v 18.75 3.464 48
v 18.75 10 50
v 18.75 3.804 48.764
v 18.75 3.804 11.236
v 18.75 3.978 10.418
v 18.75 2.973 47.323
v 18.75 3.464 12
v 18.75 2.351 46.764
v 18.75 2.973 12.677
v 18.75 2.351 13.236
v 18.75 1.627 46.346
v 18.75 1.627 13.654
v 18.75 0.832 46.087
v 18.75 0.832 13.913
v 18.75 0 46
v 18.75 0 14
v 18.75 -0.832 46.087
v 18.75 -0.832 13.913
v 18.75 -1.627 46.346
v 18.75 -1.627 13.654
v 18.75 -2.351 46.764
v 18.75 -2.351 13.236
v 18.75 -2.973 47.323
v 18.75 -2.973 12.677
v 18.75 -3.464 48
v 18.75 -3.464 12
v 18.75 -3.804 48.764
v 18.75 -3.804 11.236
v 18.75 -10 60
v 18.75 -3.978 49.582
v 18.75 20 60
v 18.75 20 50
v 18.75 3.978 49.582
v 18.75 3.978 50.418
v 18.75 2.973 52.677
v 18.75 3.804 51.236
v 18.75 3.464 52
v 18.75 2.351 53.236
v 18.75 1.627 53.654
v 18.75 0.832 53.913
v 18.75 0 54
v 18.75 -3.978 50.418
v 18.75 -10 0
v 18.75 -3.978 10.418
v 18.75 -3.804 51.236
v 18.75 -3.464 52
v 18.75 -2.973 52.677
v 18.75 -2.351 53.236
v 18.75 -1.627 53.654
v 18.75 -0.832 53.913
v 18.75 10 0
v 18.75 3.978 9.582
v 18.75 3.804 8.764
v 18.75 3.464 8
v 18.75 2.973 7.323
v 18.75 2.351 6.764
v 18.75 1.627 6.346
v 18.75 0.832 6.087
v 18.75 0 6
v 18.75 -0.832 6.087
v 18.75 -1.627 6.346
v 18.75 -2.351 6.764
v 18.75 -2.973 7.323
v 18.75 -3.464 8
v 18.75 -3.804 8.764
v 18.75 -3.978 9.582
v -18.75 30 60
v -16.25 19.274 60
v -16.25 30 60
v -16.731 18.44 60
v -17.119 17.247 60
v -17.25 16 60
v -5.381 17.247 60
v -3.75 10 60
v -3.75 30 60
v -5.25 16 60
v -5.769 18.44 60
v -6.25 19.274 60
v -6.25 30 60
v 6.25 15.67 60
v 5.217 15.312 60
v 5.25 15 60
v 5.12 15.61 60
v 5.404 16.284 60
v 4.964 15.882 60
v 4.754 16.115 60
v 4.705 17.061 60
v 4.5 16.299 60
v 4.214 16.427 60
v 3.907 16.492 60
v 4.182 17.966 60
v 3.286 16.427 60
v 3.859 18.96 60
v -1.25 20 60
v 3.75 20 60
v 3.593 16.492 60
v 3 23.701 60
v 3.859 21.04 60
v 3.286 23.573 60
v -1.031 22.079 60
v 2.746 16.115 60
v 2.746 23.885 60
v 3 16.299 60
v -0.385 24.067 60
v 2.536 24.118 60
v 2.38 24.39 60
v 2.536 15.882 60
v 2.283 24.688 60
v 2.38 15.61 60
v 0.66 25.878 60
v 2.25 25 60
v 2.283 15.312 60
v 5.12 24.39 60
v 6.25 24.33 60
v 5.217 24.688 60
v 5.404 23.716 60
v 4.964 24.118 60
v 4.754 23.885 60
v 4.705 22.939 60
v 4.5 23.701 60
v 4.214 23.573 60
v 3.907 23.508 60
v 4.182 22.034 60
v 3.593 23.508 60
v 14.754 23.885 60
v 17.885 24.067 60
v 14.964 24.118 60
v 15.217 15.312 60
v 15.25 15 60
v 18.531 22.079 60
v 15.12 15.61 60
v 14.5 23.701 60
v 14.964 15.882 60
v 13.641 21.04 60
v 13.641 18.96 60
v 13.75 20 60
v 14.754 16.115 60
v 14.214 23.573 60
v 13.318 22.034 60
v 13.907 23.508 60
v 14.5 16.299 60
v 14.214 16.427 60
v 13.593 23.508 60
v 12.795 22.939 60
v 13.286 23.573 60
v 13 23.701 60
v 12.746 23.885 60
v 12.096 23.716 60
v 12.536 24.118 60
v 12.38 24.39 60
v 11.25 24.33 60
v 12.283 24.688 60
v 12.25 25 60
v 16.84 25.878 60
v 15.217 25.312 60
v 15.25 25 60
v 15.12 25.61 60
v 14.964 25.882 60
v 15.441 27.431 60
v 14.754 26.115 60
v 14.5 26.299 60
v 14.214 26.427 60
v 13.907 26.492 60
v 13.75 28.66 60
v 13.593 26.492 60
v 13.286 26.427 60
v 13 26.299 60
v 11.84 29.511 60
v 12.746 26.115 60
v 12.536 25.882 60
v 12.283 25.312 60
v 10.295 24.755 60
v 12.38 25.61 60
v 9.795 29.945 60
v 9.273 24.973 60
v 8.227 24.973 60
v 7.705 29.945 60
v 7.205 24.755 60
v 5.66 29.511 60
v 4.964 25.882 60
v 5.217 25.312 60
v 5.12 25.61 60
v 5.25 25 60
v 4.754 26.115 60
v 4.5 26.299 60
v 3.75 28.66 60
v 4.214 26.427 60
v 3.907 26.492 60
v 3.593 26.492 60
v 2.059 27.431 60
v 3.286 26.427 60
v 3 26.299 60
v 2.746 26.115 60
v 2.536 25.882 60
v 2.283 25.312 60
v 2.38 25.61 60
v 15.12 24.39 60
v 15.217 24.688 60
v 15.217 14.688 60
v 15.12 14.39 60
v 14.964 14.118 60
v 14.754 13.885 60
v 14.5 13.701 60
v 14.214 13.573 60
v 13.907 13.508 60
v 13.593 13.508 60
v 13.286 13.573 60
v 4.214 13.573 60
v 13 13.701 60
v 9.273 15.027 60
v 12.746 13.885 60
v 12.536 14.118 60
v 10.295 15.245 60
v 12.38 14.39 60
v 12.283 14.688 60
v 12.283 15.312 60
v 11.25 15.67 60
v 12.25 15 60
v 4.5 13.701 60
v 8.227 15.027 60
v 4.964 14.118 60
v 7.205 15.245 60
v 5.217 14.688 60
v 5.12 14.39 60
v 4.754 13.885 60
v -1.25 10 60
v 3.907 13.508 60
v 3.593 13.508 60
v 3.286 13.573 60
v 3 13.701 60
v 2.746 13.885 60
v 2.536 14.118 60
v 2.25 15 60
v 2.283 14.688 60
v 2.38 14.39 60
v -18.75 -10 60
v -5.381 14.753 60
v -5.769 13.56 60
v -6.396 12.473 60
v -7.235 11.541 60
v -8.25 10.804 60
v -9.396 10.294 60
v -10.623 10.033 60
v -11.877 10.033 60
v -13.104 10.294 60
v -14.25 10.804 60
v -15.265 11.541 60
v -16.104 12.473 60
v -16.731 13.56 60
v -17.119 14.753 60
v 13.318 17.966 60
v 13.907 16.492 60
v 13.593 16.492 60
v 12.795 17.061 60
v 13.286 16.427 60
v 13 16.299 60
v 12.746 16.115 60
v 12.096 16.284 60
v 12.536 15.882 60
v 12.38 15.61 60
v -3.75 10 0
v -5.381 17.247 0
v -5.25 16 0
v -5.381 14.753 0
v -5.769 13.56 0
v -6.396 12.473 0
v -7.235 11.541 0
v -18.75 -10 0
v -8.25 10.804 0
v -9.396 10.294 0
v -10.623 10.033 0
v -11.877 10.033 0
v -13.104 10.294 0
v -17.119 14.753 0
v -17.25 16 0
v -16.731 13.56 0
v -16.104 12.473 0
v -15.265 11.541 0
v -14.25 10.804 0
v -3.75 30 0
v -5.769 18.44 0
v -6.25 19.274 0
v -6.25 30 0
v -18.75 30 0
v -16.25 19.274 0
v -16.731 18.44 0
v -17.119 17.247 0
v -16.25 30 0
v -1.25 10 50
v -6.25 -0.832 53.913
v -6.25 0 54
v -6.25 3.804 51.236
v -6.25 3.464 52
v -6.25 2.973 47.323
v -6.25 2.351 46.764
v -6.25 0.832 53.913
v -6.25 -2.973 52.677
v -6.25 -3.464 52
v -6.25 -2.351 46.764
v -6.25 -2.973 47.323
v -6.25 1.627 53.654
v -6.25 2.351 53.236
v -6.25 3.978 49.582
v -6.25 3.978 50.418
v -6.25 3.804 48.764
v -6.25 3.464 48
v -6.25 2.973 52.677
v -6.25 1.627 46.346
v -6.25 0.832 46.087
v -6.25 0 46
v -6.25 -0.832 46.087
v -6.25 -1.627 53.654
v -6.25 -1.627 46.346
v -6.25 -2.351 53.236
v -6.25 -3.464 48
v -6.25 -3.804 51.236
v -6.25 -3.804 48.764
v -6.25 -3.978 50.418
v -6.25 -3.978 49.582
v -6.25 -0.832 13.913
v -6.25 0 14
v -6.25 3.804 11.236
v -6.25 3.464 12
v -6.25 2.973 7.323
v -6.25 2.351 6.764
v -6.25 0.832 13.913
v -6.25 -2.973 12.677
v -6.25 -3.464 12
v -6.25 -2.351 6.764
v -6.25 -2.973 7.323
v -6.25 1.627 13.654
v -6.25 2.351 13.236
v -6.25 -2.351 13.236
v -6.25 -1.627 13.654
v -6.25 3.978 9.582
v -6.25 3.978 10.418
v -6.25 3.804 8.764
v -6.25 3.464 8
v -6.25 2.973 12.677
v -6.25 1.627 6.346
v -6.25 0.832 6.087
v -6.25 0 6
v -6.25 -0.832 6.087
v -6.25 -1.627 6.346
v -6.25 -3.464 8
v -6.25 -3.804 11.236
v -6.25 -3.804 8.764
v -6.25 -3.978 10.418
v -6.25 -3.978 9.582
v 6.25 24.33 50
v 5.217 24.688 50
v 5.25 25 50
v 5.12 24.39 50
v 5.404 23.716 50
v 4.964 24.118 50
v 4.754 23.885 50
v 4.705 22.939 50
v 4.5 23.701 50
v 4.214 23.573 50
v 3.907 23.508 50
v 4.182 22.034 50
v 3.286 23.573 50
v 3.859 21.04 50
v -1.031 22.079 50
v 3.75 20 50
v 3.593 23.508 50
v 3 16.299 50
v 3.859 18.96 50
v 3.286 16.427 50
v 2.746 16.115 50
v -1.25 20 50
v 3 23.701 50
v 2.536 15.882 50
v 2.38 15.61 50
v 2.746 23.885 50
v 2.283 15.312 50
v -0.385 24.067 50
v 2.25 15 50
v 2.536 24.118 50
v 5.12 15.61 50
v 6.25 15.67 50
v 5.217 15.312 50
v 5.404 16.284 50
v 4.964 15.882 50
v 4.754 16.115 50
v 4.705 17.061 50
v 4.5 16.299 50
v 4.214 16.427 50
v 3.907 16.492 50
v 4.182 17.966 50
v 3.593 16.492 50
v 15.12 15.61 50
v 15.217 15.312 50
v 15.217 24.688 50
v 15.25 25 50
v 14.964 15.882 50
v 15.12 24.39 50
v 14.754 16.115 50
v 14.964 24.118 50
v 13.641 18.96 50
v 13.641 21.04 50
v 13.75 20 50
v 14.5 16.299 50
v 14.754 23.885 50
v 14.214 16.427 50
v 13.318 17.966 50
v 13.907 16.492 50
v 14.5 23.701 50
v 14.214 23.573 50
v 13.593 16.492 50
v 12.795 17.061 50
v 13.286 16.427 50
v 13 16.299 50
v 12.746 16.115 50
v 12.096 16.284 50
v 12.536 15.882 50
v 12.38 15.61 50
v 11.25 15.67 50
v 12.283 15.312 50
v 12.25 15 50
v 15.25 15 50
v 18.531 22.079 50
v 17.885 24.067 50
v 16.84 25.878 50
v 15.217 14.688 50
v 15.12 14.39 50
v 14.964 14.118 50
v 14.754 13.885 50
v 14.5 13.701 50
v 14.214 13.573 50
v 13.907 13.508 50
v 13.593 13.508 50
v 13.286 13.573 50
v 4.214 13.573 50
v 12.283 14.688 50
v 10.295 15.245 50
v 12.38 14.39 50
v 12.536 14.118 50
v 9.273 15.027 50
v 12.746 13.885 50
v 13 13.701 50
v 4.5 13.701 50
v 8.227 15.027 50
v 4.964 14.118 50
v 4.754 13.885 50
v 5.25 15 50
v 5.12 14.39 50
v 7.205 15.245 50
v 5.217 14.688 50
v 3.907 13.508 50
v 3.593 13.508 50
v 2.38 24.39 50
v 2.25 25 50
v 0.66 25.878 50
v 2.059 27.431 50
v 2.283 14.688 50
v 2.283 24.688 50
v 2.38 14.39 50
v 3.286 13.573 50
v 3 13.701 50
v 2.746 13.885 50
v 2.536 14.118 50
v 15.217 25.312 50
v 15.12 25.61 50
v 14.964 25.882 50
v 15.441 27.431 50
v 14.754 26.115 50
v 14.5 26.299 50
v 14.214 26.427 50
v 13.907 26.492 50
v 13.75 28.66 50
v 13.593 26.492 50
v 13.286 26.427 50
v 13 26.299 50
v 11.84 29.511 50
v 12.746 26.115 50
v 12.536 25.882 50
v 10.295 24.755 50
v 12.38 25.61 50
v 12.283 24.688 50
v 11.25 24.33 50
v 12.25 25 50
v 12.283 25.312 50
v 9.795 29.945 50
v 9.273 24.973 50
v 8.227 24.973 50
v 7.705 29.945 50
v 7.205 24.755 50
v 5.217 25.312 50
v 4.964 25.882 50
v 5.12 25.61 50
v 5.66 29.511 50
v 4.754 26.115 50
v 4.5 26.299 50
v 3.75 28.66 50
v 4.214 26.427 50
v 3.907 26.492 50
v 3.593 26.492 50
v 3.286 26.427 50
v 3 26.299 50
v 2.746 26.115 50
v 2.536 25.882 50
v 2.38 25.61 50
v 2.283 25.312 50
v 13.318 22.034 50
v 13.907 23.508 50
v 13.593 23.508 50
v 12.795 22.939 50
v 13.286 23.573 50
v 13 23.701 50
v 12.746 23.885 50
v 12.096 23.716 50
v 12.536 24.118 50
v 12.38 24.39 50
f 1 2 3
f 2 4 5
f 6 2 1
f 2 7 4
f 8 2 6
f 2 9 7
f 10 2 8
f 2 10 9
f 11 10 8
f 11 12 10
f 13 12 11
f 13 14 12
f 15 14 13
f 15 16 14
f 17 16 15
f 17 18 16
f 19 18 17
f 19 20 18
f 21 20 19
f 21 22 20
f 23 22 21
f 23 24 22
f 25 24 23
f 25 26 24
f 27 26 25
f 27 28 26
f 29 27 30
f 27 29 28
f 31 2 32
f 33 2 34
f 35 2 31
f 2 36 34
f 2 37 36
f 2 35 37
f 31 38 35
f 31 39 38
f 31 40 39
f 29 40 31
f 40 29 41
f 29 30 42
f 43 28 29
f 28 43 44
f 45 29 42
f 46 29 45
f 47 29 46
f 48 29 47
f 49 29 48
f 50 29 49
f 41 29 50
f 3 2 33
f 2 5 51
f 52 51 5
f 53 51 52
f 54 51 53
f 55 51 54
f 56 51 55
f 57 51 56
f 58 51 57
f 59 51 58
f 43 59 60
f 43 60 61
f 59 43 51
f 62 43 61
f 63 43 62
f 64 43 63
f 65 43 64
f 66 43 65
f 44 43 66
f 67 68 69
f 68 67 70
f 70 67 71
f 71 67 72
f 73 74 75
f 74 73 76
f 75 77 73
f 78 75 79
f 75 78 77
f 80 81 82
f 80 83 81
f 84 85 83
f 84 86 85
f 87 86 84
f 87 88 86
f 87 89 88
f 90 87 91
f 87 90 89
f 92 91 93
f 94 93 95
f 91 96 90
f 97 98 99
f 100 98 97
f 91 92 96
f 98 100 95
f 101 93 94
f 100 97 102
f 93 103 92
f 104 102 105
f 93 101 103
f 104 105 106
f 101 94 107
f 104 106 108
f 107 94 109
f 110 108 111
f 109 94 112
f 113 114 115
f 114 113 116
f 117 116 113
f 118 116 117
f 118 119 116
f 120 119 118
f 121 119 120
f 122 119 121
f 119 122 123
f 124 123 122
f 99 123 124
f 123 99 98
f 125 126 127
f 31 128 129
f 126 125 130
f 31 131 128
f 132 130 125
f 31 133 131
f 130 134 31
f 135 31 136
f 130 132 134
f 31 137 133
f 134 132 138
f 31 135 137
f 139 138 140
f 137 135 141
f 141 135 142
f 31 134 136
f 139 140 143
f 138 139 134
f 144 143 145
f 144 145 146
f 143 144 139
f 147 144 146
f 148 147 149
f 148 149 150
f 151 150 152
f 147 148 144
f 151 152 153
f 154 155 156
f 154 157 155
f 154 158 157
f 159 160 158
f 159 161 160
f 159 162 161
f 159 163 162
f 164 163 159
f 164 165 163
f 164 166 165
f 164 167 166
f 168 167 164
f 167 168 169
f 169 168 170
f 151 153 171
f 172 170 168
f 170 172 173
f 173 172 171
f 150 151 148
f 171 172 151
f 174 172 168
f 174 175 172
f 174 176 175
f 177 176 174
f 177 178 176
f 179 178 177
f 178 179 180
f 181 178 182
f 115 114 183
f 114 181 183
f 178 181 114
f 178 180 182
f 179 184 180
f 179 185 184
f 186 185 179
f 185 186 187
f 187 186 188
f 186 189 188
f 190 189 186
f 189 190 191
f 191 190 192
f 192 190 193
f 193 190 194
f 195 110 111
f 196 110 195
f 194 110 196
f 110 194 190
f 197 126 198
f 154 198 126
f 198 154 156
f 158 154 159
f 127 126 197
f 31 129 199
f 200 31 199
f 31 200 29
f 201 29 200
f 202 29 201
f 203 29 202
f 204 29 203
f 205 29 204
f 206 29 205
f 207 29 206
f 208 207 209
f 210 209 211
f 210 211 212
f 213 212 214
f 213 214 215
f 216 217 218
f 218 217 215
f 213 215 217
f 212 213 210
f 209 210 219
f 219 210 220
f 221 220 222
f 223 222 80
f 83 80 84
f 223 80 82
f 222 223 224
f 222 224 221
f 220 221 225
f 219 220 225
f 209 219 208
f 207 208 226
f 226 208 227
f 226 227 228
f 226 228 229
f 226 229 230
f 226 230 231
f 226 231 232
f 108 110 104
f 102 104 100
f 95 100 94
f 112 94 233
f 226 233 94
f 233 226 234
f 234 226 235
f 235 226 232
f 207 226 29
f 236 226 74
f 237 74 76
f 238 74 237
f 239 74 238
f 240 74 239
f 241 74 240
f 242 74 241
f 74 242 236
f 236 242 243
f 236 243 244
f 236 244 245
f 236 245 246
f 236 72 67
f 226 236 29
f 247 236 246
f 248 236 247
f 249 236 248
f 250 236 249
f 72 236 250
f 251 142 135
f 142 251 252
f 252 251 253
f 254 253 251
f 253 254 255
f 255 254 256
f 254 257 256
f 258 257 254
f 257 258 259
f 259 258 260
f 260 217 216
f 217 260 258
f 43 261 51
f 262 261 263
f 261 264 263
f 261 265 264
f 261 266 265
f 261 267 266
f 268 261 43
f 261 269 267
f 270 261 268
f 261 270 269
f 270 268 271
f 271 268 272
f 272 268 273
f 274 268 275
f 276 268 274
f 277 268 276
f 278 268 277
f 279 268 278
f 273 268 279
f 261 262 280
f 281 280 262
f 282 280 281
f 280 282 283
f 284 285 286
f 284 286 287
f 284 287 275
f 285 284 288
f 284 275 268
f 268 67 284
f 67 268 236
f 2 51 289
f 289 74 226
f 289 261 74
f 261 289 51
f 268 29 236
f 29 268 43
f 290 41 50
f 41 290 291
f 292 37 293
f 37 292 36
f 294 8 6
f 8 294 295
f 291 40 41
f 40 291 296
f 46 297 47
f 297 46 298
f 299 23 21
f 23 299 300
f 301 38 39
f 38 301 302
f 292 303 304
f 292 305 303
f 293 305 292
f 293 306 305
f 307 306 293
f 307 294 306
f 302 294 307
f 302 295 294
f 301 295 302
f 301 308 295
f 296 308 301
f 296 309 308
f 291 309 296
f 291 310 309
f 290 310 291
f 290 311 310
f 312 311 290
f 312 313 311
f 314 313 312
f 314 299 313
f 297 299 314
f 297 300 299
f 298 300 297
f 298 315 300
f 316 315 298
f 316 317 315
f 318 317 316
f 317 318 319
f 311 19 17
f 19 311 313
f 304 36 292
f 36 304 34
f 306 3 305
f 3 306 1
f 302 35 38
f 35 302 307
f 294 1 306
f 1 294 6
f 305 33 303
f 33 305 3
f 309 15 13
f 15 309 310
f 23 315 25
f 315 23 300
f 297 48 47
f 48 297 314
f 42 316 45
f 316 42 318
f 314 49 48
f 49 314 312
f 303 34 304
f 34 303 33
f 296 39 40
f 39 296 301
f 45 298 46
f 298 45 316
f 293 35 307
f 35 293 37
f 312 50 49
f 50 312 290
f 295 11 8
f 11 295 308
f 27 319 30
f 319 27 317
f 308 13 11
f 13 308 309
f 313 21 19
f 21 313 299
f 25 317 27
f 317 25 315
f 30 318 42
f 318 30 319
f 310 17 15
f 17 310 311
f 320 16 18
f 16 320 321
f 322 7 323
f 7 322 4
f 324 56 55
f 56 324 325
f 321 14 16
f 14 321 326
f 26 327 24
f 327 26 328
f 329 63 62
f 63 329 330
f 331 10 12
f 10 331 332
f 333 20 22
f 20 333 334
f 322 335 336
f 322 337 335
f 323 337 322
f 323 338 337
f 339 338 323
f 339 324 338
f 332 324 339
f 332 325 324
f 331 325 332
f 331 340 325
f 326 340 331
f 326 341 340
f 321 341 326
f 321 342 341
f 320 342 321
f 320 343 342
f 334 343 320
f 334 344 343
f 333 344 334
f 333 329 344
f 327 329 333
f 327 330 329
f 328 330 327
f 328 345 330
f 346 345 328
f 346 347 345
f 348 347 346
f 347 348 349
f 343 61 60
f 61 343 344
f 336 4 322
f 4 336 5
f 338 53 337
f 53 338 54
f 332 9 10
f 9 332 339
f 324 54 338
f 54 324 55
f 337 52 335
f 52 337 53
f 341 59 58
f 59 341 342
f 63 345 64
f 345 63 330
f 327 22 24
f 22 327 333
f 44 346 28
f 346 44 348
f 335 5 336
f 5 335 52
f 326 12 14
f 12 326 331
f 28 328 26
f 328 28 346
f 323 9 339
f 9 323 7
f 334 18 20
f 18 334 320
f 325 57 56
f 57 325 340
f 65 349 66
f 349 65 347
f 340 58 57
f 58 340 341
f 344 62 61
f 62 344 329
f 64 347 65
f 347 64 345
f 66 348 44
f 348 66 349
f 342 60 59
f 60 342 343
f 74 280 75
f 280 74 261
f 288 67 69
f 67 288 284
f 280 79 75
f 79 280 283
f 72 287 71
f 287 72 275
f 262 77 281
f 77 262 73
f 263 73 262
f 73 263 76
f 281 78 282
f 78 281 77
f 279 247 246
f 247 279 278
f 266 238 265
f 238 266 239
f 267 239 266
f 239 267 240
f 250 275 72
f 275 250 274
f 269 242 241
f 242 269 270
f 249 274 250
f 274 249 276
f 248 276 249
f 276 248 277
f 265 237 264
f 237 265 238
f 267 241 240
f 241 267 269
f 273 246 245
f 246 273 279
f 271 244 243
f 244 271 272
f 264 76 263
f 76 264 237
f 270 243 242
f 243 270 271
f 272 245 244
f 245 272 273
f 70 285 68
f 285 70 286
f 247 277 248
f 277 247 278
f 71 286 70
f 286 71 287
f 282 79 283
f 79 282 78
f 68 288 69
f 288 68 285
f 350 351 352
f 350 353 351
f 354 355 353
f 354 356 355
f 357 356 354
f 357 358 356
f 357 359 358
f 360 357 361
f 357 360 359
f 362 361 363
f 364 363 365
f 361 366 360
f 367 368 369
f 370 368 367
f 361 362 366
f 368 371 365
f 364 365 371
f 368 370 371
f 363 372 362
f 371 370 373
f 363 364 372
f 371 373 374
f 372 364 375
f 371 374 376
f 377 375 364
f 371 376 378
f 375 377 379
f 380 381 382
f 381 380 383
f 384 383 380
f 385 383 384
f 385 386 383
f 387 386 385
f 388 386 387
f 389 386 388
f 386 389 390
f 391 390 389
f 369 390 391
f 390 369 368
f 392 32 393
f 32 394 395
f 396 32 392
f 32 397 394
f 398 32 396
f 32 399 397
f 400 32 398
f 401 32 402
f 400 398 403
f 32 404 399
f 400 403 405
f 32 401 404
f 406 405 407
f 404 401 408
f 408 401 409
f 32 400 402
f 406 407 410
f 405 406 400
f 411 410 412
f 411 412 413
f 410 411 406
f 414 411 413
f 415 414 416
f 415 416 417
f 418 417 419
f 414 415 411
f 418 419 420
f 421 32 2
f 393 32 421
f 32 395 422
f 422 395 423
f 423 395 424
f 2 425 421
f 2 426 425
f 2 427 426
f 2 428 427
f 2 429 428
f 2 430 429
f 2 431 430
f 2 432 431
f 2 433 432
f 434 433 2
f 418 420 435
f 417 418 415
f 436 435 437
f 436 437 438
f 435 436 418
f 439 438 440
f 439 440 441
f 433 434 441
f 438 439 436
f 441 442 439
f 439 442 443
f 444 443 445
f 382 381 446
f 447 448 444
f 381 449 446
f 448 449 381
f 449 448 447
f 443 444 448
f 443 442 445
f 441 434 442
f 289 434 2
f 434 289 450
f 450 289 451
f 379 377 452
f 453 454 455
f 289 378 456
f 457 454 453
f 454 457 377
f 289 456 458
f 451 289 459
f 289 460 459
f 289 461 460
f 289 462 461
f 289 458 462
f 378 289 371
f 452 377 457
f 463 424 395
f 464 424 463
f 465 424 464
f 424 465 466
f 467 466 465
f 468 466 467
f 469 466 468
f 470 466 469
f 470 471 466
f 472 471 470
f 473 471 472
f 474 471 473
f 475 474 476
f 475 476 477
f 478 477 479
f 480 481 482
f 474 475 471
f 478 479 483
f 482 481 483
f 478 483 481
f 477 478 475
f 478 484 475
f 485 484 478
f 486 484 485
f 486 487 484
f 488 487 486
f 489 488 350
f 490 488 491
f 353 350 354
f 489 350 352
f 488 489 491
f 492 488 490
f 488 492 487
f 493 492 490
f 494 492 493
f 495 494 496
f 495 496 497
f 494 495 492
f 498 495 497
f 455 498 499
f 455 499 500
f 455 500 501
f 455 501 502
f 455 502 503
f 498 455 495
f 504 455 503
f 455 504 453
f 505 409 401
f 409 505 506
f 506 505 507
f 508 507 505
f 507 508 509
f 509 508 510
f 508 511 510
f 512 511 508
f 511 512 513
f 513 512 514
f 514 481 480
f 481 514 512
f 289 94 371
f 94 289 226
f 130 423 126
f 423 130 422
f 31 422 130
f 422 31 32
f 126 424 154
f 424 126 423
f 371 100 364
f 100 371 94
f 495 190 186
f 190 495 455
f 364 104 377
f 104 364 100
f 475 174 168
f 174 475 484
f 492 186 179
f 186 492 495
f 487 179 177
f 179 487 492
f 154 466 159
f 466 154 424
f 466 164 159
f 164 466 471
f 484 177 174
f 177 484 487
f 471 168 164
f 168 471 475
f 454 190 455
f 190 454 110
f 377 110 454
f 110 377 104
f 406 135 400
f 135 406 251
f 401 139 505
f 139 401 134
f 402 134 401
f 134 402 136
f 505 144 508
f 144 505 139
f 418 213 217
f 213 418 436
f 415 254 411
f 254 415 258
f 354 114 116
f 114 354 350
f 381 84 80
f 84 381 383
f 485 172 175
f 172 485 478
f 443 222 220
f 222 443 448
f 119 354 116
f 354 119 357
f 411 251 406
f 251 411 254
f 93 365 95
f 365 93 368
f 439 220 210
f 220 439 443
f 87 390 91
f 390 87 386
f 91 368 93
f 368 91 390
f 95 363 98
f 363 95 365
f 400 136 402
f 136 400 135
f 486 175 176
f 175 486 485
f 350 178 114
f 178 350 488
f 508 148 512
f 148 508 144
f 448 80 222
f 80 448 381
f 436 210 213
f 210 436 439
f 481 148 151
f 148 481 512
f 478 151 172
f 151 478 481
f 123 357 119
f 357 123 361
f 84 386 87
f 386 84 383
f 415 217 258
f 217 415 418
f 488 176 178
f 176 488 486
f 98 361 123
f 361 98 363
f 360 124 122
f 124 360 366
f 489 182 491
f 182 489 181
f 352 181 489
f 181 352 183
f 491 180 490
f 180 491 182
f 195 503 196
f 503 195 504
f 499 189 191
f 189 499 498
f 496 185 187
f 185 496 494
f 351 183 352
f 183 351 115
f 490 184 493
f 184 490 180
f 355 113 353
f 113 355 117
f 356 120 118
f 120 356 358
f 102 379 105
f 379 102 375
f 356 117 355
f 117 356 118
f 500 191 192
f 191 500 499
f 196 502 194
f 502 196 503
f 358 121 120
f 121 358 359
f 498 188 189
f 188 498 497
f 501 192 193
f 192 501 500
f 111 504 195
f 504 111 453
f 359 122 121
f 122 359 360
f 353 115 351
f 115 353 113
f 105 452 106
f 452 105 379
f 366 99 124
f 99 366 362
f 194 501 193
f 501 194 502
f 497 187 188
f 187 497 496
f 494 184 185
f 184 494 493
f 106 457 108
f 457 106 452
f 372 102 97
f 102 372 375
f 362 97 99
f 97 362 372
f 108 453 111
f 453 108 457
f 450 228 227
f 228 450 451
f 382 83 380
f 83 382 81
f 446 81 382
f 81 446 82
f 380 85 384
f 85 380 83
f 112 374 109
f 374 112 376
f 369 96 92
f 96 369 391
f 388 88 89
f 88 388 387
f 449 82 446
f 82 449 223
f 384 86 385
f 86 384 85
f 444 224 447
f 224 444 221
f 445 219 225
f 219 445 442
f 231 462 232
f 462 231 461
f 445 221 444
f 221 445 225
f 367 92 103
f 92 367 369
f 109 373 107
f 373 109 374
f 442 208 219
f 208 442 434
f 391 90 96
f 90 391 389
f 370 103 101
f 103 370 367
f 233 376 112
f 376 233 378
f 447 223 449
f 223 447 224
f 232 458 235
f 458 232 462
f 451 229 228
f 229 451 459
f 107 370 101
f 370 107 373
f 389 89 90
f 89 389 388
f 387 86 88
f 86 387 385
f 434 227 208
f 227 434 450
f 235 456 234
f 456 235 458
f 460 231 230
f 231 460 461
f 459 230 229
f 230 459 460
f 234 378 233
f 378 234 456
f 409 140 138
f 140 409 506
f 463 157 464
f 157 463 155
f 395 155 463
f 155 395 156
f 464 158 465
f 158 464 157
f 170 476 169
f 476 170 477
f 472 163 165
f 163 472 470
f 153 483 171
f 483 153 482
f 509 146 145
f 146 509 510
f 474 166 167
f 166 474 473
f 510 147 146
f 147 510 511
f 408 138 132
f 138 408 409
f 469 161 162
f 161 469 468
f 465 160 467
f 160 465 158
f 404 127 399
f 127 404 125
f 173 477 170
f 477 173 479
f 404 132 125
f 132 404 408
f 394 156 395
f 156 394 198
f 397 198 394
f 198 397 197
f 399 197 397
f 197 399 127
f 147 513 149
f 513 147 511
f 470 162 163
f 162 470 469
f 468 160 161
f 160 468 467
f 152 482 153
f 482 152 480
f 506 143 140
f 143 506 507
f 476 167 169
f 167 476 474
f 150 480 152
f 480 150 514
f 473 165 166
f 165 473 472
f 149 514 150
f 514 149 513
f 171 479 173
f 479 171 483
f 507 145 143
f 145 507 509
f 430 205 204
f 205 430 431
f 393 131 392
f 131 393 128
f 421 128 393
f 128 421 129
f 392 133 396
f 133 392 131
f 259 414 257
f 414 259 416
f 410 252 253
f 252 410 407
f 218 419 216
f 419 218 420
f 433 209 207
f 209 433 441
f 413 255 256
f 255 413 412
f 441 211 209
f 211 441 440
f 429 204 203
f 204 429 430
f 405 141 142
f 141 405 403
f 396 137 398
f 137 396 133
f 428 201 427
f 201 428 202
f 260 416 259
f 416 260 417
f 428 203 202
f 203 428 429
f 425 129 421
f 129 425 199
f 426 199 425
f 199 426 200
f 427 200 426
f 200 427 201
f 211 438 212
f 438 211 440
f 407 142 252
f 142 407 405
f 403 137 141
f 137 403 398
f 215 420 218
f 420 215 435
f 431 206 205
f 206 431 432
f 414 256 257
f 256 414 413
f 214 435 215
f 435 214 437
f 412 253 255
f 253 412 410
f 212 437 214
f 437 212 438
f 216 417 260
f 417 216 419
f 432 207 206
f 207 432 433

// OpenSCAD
$fn=30;

/*[Global]*/
//Axis=[r]
AxisRadius = [4];
//Slider Hole [radius]
SliderHoleRadius = [6];
//M3 Screw Thread Clearance Radius
M3ScrewHole = [1.5];
//Z Axis Guide to Z Screw 
ZA2ZSSeparation = [25];

/*[Z Screw Holder Block]*/
//Z Screw Holder Block = [OuterRadius, InnerRadius, Height]
ZSH = [10, 5, 10];
ZSHM3Separation = [10];

/*[Z Axis Holder Block]*/
//Z Axis Holder = [w,d]
ZAH = [15,20];
//Z Axis Cutout to Slider Hole = [w]
ZAHCutout = [10];

/*[X Axis Holder Block]*/
//X Axis Holder = [w,d,h]
XAH = [ZA2ZSSeparation[0] + ZAH[0]/2 + ZSH[0]/2,20,60];
//X Axis Hole depth and position from the bottom of the Holder block
XAxisHoleDepth = [25];
XAxisHoleSeparation = [40];
XAxisHole1Height = XAH[2]/2+XAxisHoleSeparation[0]/2;
XAxisHole2Height = XAH[2]/2-XAxisHoleSeparation[0]/2;


module XAxisHolder() {
    //X Axis Holder Block
    difference() {
        //X Axis Holder Raw Block
        #translate(-[XAH[0]/2, XAH[1]/2, 0])
            cube([XAH[0], XAH[1], XAH[2]]);

        //X Axis Support Hole 1
        translate([XAH[0]/2,0, XAxisHole1Height])
            rotate([0,-90,0])
                cylinder(r=AxisRadius[0], h=XAxisHoleDepth[0]);

        //X Axis Support Hole 2
        translate([XAH[0]/2,0, XAxisHole2Height])
            rotate([0,-90,0])
                cylinder(r=AxisRadius[0], h=XAxisHoleDepth[0]);
    }
}

module ZAxisHolder() {
    difference() {
        //Z Axis Holder Raw Block
        translate([-ZAH[0]/2,0,0])
            cube([ZAH[0], ZAH[1], XAH[2]]);
        //Z Axis Slider holder
        translate([0, SliderHoleRadius[0], 0])
            cylinder(r=SliderHoleRadius[0], h=XAH[2]);
        // Z Axis Holder cutout to Slider holder
        translate([-ZAHCutout[0]/2,SliderHoleRadius[0],0])
            cube([ZAHCutout[0],ZAH[1]-SliderHoleRadius[0], XAH[2]]);
    }
}

module ZScrewHolder() {
    //Z Screw Holder Main Block
    difference() {
        union() {
            translate([-ZSH[0],0,0]) cube([ZSH[0]*2,ZSH[0],ZSH[2]]);
            translate([0,ZSH[0],0]) cylinder(r=ZSH[0], h=ZSH[2]);
        }
        //Z Screw Holder centre hole
        translate([0,ZSH[0],0]) cylinder(r=ZSH[1], h=ZSH[2]);
        //Z Screw Holder M3 Throughholes
        translate([-ZSHM3Separation[0]/2, ZSH[0]+ZSHM3Separation[0]/2,0]) cylinder(r=M3ScrewHole[0], h=ZSH[2]);
        translate([-ZSHM3Separation[0]/2, ZSH[0]-ZSHM3Separation[0]/2,0]) cylinder(r=M3ScrewHole[0], h=ZSH[2]);
        translate([ZSHM3Separation[0]/2, ZSH[0]+ZSHM3Separation[0]/2,0]) cylinder(r=M3ScrewHole[0], h=ZSH[2]);
        translate([ZSHM3Separation[0]/2, ZSH[0]-ZSHM3Separation[0]/2,0]) cylinder(r=M3ScrewHole[0], h=ZSH[2]);

    }
    
}

//Z Axis Holder Left Construction
XAxisHolder();
translate([-XAH[0]/2+ZAH[0]/2,XAH[1]/2,0]) ZAxisHolder();
translate([XAH[0]/2-ZSH[0],XAH[1]/2,XAH[2]-ZSH[2]]) ZScrewHolder();



   /*    #linear_extrude(XAH[2])
            polygon([
                [-XAH[0]/2,-XAH[1]/2],
                [XAH[0]/2,-XAH[1]/2],
                [XAH[0]/2,XAH[1]/2],
                [-XAH[0]/2,XAH[1]/2]]
            );*/
 
